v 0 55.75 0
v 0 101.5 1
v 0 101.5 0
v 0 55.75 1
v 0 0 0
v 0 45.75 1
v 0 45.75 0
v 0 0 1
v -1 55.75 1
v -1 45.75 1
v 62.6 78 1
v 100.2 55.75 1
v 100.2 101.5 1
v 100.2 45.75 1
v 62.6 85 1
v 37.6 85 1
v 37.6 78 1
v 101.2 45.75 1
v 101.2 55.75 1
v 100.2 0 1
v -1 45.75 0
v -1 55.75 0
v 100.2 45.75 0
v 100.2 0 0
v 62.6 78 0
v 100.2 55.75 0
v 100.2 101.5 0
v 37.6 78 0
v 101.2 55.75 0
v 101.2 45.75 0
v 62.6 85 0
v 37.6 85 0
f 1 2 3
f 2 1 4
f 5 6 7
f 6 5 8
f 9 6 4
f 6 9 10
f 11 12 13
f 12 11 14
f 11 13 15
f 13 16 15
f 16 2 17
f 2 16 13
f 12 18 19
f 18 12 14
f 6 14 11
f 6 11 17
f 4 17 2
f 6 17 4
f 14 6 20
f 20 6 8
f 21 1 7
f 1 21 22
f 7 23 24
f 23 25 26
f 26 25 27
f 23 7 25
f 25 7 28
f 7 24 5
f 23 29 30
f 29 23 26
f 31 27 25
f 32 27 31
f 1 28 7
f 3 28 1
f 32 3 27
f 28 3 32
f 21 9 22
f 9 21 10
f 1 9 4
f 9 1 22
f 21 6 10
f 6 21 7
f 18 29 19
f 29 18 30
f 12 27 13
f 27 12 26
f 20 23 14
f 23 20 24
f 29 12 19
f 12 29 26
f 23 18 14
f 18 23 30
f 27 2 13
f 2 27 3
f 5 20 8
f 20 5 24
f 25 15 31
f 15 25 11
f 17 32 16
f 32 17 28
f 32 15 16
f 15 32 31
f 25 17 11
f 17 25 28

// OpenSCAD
$fs=0.25;$fa=6;
difference(){union() {
translate([50.1,50.75,0.5])cube([100.2,101.5,1],center=true);
union() {
translate([-0.5,50.75,0.5])cube([1,10,1],center=true);
translate([100.7,50.75,0.5])cube([1,10,1],center=true);
}
}
translate([50.1,81.5,0.5])cube([25,7,1],center=true);
}
